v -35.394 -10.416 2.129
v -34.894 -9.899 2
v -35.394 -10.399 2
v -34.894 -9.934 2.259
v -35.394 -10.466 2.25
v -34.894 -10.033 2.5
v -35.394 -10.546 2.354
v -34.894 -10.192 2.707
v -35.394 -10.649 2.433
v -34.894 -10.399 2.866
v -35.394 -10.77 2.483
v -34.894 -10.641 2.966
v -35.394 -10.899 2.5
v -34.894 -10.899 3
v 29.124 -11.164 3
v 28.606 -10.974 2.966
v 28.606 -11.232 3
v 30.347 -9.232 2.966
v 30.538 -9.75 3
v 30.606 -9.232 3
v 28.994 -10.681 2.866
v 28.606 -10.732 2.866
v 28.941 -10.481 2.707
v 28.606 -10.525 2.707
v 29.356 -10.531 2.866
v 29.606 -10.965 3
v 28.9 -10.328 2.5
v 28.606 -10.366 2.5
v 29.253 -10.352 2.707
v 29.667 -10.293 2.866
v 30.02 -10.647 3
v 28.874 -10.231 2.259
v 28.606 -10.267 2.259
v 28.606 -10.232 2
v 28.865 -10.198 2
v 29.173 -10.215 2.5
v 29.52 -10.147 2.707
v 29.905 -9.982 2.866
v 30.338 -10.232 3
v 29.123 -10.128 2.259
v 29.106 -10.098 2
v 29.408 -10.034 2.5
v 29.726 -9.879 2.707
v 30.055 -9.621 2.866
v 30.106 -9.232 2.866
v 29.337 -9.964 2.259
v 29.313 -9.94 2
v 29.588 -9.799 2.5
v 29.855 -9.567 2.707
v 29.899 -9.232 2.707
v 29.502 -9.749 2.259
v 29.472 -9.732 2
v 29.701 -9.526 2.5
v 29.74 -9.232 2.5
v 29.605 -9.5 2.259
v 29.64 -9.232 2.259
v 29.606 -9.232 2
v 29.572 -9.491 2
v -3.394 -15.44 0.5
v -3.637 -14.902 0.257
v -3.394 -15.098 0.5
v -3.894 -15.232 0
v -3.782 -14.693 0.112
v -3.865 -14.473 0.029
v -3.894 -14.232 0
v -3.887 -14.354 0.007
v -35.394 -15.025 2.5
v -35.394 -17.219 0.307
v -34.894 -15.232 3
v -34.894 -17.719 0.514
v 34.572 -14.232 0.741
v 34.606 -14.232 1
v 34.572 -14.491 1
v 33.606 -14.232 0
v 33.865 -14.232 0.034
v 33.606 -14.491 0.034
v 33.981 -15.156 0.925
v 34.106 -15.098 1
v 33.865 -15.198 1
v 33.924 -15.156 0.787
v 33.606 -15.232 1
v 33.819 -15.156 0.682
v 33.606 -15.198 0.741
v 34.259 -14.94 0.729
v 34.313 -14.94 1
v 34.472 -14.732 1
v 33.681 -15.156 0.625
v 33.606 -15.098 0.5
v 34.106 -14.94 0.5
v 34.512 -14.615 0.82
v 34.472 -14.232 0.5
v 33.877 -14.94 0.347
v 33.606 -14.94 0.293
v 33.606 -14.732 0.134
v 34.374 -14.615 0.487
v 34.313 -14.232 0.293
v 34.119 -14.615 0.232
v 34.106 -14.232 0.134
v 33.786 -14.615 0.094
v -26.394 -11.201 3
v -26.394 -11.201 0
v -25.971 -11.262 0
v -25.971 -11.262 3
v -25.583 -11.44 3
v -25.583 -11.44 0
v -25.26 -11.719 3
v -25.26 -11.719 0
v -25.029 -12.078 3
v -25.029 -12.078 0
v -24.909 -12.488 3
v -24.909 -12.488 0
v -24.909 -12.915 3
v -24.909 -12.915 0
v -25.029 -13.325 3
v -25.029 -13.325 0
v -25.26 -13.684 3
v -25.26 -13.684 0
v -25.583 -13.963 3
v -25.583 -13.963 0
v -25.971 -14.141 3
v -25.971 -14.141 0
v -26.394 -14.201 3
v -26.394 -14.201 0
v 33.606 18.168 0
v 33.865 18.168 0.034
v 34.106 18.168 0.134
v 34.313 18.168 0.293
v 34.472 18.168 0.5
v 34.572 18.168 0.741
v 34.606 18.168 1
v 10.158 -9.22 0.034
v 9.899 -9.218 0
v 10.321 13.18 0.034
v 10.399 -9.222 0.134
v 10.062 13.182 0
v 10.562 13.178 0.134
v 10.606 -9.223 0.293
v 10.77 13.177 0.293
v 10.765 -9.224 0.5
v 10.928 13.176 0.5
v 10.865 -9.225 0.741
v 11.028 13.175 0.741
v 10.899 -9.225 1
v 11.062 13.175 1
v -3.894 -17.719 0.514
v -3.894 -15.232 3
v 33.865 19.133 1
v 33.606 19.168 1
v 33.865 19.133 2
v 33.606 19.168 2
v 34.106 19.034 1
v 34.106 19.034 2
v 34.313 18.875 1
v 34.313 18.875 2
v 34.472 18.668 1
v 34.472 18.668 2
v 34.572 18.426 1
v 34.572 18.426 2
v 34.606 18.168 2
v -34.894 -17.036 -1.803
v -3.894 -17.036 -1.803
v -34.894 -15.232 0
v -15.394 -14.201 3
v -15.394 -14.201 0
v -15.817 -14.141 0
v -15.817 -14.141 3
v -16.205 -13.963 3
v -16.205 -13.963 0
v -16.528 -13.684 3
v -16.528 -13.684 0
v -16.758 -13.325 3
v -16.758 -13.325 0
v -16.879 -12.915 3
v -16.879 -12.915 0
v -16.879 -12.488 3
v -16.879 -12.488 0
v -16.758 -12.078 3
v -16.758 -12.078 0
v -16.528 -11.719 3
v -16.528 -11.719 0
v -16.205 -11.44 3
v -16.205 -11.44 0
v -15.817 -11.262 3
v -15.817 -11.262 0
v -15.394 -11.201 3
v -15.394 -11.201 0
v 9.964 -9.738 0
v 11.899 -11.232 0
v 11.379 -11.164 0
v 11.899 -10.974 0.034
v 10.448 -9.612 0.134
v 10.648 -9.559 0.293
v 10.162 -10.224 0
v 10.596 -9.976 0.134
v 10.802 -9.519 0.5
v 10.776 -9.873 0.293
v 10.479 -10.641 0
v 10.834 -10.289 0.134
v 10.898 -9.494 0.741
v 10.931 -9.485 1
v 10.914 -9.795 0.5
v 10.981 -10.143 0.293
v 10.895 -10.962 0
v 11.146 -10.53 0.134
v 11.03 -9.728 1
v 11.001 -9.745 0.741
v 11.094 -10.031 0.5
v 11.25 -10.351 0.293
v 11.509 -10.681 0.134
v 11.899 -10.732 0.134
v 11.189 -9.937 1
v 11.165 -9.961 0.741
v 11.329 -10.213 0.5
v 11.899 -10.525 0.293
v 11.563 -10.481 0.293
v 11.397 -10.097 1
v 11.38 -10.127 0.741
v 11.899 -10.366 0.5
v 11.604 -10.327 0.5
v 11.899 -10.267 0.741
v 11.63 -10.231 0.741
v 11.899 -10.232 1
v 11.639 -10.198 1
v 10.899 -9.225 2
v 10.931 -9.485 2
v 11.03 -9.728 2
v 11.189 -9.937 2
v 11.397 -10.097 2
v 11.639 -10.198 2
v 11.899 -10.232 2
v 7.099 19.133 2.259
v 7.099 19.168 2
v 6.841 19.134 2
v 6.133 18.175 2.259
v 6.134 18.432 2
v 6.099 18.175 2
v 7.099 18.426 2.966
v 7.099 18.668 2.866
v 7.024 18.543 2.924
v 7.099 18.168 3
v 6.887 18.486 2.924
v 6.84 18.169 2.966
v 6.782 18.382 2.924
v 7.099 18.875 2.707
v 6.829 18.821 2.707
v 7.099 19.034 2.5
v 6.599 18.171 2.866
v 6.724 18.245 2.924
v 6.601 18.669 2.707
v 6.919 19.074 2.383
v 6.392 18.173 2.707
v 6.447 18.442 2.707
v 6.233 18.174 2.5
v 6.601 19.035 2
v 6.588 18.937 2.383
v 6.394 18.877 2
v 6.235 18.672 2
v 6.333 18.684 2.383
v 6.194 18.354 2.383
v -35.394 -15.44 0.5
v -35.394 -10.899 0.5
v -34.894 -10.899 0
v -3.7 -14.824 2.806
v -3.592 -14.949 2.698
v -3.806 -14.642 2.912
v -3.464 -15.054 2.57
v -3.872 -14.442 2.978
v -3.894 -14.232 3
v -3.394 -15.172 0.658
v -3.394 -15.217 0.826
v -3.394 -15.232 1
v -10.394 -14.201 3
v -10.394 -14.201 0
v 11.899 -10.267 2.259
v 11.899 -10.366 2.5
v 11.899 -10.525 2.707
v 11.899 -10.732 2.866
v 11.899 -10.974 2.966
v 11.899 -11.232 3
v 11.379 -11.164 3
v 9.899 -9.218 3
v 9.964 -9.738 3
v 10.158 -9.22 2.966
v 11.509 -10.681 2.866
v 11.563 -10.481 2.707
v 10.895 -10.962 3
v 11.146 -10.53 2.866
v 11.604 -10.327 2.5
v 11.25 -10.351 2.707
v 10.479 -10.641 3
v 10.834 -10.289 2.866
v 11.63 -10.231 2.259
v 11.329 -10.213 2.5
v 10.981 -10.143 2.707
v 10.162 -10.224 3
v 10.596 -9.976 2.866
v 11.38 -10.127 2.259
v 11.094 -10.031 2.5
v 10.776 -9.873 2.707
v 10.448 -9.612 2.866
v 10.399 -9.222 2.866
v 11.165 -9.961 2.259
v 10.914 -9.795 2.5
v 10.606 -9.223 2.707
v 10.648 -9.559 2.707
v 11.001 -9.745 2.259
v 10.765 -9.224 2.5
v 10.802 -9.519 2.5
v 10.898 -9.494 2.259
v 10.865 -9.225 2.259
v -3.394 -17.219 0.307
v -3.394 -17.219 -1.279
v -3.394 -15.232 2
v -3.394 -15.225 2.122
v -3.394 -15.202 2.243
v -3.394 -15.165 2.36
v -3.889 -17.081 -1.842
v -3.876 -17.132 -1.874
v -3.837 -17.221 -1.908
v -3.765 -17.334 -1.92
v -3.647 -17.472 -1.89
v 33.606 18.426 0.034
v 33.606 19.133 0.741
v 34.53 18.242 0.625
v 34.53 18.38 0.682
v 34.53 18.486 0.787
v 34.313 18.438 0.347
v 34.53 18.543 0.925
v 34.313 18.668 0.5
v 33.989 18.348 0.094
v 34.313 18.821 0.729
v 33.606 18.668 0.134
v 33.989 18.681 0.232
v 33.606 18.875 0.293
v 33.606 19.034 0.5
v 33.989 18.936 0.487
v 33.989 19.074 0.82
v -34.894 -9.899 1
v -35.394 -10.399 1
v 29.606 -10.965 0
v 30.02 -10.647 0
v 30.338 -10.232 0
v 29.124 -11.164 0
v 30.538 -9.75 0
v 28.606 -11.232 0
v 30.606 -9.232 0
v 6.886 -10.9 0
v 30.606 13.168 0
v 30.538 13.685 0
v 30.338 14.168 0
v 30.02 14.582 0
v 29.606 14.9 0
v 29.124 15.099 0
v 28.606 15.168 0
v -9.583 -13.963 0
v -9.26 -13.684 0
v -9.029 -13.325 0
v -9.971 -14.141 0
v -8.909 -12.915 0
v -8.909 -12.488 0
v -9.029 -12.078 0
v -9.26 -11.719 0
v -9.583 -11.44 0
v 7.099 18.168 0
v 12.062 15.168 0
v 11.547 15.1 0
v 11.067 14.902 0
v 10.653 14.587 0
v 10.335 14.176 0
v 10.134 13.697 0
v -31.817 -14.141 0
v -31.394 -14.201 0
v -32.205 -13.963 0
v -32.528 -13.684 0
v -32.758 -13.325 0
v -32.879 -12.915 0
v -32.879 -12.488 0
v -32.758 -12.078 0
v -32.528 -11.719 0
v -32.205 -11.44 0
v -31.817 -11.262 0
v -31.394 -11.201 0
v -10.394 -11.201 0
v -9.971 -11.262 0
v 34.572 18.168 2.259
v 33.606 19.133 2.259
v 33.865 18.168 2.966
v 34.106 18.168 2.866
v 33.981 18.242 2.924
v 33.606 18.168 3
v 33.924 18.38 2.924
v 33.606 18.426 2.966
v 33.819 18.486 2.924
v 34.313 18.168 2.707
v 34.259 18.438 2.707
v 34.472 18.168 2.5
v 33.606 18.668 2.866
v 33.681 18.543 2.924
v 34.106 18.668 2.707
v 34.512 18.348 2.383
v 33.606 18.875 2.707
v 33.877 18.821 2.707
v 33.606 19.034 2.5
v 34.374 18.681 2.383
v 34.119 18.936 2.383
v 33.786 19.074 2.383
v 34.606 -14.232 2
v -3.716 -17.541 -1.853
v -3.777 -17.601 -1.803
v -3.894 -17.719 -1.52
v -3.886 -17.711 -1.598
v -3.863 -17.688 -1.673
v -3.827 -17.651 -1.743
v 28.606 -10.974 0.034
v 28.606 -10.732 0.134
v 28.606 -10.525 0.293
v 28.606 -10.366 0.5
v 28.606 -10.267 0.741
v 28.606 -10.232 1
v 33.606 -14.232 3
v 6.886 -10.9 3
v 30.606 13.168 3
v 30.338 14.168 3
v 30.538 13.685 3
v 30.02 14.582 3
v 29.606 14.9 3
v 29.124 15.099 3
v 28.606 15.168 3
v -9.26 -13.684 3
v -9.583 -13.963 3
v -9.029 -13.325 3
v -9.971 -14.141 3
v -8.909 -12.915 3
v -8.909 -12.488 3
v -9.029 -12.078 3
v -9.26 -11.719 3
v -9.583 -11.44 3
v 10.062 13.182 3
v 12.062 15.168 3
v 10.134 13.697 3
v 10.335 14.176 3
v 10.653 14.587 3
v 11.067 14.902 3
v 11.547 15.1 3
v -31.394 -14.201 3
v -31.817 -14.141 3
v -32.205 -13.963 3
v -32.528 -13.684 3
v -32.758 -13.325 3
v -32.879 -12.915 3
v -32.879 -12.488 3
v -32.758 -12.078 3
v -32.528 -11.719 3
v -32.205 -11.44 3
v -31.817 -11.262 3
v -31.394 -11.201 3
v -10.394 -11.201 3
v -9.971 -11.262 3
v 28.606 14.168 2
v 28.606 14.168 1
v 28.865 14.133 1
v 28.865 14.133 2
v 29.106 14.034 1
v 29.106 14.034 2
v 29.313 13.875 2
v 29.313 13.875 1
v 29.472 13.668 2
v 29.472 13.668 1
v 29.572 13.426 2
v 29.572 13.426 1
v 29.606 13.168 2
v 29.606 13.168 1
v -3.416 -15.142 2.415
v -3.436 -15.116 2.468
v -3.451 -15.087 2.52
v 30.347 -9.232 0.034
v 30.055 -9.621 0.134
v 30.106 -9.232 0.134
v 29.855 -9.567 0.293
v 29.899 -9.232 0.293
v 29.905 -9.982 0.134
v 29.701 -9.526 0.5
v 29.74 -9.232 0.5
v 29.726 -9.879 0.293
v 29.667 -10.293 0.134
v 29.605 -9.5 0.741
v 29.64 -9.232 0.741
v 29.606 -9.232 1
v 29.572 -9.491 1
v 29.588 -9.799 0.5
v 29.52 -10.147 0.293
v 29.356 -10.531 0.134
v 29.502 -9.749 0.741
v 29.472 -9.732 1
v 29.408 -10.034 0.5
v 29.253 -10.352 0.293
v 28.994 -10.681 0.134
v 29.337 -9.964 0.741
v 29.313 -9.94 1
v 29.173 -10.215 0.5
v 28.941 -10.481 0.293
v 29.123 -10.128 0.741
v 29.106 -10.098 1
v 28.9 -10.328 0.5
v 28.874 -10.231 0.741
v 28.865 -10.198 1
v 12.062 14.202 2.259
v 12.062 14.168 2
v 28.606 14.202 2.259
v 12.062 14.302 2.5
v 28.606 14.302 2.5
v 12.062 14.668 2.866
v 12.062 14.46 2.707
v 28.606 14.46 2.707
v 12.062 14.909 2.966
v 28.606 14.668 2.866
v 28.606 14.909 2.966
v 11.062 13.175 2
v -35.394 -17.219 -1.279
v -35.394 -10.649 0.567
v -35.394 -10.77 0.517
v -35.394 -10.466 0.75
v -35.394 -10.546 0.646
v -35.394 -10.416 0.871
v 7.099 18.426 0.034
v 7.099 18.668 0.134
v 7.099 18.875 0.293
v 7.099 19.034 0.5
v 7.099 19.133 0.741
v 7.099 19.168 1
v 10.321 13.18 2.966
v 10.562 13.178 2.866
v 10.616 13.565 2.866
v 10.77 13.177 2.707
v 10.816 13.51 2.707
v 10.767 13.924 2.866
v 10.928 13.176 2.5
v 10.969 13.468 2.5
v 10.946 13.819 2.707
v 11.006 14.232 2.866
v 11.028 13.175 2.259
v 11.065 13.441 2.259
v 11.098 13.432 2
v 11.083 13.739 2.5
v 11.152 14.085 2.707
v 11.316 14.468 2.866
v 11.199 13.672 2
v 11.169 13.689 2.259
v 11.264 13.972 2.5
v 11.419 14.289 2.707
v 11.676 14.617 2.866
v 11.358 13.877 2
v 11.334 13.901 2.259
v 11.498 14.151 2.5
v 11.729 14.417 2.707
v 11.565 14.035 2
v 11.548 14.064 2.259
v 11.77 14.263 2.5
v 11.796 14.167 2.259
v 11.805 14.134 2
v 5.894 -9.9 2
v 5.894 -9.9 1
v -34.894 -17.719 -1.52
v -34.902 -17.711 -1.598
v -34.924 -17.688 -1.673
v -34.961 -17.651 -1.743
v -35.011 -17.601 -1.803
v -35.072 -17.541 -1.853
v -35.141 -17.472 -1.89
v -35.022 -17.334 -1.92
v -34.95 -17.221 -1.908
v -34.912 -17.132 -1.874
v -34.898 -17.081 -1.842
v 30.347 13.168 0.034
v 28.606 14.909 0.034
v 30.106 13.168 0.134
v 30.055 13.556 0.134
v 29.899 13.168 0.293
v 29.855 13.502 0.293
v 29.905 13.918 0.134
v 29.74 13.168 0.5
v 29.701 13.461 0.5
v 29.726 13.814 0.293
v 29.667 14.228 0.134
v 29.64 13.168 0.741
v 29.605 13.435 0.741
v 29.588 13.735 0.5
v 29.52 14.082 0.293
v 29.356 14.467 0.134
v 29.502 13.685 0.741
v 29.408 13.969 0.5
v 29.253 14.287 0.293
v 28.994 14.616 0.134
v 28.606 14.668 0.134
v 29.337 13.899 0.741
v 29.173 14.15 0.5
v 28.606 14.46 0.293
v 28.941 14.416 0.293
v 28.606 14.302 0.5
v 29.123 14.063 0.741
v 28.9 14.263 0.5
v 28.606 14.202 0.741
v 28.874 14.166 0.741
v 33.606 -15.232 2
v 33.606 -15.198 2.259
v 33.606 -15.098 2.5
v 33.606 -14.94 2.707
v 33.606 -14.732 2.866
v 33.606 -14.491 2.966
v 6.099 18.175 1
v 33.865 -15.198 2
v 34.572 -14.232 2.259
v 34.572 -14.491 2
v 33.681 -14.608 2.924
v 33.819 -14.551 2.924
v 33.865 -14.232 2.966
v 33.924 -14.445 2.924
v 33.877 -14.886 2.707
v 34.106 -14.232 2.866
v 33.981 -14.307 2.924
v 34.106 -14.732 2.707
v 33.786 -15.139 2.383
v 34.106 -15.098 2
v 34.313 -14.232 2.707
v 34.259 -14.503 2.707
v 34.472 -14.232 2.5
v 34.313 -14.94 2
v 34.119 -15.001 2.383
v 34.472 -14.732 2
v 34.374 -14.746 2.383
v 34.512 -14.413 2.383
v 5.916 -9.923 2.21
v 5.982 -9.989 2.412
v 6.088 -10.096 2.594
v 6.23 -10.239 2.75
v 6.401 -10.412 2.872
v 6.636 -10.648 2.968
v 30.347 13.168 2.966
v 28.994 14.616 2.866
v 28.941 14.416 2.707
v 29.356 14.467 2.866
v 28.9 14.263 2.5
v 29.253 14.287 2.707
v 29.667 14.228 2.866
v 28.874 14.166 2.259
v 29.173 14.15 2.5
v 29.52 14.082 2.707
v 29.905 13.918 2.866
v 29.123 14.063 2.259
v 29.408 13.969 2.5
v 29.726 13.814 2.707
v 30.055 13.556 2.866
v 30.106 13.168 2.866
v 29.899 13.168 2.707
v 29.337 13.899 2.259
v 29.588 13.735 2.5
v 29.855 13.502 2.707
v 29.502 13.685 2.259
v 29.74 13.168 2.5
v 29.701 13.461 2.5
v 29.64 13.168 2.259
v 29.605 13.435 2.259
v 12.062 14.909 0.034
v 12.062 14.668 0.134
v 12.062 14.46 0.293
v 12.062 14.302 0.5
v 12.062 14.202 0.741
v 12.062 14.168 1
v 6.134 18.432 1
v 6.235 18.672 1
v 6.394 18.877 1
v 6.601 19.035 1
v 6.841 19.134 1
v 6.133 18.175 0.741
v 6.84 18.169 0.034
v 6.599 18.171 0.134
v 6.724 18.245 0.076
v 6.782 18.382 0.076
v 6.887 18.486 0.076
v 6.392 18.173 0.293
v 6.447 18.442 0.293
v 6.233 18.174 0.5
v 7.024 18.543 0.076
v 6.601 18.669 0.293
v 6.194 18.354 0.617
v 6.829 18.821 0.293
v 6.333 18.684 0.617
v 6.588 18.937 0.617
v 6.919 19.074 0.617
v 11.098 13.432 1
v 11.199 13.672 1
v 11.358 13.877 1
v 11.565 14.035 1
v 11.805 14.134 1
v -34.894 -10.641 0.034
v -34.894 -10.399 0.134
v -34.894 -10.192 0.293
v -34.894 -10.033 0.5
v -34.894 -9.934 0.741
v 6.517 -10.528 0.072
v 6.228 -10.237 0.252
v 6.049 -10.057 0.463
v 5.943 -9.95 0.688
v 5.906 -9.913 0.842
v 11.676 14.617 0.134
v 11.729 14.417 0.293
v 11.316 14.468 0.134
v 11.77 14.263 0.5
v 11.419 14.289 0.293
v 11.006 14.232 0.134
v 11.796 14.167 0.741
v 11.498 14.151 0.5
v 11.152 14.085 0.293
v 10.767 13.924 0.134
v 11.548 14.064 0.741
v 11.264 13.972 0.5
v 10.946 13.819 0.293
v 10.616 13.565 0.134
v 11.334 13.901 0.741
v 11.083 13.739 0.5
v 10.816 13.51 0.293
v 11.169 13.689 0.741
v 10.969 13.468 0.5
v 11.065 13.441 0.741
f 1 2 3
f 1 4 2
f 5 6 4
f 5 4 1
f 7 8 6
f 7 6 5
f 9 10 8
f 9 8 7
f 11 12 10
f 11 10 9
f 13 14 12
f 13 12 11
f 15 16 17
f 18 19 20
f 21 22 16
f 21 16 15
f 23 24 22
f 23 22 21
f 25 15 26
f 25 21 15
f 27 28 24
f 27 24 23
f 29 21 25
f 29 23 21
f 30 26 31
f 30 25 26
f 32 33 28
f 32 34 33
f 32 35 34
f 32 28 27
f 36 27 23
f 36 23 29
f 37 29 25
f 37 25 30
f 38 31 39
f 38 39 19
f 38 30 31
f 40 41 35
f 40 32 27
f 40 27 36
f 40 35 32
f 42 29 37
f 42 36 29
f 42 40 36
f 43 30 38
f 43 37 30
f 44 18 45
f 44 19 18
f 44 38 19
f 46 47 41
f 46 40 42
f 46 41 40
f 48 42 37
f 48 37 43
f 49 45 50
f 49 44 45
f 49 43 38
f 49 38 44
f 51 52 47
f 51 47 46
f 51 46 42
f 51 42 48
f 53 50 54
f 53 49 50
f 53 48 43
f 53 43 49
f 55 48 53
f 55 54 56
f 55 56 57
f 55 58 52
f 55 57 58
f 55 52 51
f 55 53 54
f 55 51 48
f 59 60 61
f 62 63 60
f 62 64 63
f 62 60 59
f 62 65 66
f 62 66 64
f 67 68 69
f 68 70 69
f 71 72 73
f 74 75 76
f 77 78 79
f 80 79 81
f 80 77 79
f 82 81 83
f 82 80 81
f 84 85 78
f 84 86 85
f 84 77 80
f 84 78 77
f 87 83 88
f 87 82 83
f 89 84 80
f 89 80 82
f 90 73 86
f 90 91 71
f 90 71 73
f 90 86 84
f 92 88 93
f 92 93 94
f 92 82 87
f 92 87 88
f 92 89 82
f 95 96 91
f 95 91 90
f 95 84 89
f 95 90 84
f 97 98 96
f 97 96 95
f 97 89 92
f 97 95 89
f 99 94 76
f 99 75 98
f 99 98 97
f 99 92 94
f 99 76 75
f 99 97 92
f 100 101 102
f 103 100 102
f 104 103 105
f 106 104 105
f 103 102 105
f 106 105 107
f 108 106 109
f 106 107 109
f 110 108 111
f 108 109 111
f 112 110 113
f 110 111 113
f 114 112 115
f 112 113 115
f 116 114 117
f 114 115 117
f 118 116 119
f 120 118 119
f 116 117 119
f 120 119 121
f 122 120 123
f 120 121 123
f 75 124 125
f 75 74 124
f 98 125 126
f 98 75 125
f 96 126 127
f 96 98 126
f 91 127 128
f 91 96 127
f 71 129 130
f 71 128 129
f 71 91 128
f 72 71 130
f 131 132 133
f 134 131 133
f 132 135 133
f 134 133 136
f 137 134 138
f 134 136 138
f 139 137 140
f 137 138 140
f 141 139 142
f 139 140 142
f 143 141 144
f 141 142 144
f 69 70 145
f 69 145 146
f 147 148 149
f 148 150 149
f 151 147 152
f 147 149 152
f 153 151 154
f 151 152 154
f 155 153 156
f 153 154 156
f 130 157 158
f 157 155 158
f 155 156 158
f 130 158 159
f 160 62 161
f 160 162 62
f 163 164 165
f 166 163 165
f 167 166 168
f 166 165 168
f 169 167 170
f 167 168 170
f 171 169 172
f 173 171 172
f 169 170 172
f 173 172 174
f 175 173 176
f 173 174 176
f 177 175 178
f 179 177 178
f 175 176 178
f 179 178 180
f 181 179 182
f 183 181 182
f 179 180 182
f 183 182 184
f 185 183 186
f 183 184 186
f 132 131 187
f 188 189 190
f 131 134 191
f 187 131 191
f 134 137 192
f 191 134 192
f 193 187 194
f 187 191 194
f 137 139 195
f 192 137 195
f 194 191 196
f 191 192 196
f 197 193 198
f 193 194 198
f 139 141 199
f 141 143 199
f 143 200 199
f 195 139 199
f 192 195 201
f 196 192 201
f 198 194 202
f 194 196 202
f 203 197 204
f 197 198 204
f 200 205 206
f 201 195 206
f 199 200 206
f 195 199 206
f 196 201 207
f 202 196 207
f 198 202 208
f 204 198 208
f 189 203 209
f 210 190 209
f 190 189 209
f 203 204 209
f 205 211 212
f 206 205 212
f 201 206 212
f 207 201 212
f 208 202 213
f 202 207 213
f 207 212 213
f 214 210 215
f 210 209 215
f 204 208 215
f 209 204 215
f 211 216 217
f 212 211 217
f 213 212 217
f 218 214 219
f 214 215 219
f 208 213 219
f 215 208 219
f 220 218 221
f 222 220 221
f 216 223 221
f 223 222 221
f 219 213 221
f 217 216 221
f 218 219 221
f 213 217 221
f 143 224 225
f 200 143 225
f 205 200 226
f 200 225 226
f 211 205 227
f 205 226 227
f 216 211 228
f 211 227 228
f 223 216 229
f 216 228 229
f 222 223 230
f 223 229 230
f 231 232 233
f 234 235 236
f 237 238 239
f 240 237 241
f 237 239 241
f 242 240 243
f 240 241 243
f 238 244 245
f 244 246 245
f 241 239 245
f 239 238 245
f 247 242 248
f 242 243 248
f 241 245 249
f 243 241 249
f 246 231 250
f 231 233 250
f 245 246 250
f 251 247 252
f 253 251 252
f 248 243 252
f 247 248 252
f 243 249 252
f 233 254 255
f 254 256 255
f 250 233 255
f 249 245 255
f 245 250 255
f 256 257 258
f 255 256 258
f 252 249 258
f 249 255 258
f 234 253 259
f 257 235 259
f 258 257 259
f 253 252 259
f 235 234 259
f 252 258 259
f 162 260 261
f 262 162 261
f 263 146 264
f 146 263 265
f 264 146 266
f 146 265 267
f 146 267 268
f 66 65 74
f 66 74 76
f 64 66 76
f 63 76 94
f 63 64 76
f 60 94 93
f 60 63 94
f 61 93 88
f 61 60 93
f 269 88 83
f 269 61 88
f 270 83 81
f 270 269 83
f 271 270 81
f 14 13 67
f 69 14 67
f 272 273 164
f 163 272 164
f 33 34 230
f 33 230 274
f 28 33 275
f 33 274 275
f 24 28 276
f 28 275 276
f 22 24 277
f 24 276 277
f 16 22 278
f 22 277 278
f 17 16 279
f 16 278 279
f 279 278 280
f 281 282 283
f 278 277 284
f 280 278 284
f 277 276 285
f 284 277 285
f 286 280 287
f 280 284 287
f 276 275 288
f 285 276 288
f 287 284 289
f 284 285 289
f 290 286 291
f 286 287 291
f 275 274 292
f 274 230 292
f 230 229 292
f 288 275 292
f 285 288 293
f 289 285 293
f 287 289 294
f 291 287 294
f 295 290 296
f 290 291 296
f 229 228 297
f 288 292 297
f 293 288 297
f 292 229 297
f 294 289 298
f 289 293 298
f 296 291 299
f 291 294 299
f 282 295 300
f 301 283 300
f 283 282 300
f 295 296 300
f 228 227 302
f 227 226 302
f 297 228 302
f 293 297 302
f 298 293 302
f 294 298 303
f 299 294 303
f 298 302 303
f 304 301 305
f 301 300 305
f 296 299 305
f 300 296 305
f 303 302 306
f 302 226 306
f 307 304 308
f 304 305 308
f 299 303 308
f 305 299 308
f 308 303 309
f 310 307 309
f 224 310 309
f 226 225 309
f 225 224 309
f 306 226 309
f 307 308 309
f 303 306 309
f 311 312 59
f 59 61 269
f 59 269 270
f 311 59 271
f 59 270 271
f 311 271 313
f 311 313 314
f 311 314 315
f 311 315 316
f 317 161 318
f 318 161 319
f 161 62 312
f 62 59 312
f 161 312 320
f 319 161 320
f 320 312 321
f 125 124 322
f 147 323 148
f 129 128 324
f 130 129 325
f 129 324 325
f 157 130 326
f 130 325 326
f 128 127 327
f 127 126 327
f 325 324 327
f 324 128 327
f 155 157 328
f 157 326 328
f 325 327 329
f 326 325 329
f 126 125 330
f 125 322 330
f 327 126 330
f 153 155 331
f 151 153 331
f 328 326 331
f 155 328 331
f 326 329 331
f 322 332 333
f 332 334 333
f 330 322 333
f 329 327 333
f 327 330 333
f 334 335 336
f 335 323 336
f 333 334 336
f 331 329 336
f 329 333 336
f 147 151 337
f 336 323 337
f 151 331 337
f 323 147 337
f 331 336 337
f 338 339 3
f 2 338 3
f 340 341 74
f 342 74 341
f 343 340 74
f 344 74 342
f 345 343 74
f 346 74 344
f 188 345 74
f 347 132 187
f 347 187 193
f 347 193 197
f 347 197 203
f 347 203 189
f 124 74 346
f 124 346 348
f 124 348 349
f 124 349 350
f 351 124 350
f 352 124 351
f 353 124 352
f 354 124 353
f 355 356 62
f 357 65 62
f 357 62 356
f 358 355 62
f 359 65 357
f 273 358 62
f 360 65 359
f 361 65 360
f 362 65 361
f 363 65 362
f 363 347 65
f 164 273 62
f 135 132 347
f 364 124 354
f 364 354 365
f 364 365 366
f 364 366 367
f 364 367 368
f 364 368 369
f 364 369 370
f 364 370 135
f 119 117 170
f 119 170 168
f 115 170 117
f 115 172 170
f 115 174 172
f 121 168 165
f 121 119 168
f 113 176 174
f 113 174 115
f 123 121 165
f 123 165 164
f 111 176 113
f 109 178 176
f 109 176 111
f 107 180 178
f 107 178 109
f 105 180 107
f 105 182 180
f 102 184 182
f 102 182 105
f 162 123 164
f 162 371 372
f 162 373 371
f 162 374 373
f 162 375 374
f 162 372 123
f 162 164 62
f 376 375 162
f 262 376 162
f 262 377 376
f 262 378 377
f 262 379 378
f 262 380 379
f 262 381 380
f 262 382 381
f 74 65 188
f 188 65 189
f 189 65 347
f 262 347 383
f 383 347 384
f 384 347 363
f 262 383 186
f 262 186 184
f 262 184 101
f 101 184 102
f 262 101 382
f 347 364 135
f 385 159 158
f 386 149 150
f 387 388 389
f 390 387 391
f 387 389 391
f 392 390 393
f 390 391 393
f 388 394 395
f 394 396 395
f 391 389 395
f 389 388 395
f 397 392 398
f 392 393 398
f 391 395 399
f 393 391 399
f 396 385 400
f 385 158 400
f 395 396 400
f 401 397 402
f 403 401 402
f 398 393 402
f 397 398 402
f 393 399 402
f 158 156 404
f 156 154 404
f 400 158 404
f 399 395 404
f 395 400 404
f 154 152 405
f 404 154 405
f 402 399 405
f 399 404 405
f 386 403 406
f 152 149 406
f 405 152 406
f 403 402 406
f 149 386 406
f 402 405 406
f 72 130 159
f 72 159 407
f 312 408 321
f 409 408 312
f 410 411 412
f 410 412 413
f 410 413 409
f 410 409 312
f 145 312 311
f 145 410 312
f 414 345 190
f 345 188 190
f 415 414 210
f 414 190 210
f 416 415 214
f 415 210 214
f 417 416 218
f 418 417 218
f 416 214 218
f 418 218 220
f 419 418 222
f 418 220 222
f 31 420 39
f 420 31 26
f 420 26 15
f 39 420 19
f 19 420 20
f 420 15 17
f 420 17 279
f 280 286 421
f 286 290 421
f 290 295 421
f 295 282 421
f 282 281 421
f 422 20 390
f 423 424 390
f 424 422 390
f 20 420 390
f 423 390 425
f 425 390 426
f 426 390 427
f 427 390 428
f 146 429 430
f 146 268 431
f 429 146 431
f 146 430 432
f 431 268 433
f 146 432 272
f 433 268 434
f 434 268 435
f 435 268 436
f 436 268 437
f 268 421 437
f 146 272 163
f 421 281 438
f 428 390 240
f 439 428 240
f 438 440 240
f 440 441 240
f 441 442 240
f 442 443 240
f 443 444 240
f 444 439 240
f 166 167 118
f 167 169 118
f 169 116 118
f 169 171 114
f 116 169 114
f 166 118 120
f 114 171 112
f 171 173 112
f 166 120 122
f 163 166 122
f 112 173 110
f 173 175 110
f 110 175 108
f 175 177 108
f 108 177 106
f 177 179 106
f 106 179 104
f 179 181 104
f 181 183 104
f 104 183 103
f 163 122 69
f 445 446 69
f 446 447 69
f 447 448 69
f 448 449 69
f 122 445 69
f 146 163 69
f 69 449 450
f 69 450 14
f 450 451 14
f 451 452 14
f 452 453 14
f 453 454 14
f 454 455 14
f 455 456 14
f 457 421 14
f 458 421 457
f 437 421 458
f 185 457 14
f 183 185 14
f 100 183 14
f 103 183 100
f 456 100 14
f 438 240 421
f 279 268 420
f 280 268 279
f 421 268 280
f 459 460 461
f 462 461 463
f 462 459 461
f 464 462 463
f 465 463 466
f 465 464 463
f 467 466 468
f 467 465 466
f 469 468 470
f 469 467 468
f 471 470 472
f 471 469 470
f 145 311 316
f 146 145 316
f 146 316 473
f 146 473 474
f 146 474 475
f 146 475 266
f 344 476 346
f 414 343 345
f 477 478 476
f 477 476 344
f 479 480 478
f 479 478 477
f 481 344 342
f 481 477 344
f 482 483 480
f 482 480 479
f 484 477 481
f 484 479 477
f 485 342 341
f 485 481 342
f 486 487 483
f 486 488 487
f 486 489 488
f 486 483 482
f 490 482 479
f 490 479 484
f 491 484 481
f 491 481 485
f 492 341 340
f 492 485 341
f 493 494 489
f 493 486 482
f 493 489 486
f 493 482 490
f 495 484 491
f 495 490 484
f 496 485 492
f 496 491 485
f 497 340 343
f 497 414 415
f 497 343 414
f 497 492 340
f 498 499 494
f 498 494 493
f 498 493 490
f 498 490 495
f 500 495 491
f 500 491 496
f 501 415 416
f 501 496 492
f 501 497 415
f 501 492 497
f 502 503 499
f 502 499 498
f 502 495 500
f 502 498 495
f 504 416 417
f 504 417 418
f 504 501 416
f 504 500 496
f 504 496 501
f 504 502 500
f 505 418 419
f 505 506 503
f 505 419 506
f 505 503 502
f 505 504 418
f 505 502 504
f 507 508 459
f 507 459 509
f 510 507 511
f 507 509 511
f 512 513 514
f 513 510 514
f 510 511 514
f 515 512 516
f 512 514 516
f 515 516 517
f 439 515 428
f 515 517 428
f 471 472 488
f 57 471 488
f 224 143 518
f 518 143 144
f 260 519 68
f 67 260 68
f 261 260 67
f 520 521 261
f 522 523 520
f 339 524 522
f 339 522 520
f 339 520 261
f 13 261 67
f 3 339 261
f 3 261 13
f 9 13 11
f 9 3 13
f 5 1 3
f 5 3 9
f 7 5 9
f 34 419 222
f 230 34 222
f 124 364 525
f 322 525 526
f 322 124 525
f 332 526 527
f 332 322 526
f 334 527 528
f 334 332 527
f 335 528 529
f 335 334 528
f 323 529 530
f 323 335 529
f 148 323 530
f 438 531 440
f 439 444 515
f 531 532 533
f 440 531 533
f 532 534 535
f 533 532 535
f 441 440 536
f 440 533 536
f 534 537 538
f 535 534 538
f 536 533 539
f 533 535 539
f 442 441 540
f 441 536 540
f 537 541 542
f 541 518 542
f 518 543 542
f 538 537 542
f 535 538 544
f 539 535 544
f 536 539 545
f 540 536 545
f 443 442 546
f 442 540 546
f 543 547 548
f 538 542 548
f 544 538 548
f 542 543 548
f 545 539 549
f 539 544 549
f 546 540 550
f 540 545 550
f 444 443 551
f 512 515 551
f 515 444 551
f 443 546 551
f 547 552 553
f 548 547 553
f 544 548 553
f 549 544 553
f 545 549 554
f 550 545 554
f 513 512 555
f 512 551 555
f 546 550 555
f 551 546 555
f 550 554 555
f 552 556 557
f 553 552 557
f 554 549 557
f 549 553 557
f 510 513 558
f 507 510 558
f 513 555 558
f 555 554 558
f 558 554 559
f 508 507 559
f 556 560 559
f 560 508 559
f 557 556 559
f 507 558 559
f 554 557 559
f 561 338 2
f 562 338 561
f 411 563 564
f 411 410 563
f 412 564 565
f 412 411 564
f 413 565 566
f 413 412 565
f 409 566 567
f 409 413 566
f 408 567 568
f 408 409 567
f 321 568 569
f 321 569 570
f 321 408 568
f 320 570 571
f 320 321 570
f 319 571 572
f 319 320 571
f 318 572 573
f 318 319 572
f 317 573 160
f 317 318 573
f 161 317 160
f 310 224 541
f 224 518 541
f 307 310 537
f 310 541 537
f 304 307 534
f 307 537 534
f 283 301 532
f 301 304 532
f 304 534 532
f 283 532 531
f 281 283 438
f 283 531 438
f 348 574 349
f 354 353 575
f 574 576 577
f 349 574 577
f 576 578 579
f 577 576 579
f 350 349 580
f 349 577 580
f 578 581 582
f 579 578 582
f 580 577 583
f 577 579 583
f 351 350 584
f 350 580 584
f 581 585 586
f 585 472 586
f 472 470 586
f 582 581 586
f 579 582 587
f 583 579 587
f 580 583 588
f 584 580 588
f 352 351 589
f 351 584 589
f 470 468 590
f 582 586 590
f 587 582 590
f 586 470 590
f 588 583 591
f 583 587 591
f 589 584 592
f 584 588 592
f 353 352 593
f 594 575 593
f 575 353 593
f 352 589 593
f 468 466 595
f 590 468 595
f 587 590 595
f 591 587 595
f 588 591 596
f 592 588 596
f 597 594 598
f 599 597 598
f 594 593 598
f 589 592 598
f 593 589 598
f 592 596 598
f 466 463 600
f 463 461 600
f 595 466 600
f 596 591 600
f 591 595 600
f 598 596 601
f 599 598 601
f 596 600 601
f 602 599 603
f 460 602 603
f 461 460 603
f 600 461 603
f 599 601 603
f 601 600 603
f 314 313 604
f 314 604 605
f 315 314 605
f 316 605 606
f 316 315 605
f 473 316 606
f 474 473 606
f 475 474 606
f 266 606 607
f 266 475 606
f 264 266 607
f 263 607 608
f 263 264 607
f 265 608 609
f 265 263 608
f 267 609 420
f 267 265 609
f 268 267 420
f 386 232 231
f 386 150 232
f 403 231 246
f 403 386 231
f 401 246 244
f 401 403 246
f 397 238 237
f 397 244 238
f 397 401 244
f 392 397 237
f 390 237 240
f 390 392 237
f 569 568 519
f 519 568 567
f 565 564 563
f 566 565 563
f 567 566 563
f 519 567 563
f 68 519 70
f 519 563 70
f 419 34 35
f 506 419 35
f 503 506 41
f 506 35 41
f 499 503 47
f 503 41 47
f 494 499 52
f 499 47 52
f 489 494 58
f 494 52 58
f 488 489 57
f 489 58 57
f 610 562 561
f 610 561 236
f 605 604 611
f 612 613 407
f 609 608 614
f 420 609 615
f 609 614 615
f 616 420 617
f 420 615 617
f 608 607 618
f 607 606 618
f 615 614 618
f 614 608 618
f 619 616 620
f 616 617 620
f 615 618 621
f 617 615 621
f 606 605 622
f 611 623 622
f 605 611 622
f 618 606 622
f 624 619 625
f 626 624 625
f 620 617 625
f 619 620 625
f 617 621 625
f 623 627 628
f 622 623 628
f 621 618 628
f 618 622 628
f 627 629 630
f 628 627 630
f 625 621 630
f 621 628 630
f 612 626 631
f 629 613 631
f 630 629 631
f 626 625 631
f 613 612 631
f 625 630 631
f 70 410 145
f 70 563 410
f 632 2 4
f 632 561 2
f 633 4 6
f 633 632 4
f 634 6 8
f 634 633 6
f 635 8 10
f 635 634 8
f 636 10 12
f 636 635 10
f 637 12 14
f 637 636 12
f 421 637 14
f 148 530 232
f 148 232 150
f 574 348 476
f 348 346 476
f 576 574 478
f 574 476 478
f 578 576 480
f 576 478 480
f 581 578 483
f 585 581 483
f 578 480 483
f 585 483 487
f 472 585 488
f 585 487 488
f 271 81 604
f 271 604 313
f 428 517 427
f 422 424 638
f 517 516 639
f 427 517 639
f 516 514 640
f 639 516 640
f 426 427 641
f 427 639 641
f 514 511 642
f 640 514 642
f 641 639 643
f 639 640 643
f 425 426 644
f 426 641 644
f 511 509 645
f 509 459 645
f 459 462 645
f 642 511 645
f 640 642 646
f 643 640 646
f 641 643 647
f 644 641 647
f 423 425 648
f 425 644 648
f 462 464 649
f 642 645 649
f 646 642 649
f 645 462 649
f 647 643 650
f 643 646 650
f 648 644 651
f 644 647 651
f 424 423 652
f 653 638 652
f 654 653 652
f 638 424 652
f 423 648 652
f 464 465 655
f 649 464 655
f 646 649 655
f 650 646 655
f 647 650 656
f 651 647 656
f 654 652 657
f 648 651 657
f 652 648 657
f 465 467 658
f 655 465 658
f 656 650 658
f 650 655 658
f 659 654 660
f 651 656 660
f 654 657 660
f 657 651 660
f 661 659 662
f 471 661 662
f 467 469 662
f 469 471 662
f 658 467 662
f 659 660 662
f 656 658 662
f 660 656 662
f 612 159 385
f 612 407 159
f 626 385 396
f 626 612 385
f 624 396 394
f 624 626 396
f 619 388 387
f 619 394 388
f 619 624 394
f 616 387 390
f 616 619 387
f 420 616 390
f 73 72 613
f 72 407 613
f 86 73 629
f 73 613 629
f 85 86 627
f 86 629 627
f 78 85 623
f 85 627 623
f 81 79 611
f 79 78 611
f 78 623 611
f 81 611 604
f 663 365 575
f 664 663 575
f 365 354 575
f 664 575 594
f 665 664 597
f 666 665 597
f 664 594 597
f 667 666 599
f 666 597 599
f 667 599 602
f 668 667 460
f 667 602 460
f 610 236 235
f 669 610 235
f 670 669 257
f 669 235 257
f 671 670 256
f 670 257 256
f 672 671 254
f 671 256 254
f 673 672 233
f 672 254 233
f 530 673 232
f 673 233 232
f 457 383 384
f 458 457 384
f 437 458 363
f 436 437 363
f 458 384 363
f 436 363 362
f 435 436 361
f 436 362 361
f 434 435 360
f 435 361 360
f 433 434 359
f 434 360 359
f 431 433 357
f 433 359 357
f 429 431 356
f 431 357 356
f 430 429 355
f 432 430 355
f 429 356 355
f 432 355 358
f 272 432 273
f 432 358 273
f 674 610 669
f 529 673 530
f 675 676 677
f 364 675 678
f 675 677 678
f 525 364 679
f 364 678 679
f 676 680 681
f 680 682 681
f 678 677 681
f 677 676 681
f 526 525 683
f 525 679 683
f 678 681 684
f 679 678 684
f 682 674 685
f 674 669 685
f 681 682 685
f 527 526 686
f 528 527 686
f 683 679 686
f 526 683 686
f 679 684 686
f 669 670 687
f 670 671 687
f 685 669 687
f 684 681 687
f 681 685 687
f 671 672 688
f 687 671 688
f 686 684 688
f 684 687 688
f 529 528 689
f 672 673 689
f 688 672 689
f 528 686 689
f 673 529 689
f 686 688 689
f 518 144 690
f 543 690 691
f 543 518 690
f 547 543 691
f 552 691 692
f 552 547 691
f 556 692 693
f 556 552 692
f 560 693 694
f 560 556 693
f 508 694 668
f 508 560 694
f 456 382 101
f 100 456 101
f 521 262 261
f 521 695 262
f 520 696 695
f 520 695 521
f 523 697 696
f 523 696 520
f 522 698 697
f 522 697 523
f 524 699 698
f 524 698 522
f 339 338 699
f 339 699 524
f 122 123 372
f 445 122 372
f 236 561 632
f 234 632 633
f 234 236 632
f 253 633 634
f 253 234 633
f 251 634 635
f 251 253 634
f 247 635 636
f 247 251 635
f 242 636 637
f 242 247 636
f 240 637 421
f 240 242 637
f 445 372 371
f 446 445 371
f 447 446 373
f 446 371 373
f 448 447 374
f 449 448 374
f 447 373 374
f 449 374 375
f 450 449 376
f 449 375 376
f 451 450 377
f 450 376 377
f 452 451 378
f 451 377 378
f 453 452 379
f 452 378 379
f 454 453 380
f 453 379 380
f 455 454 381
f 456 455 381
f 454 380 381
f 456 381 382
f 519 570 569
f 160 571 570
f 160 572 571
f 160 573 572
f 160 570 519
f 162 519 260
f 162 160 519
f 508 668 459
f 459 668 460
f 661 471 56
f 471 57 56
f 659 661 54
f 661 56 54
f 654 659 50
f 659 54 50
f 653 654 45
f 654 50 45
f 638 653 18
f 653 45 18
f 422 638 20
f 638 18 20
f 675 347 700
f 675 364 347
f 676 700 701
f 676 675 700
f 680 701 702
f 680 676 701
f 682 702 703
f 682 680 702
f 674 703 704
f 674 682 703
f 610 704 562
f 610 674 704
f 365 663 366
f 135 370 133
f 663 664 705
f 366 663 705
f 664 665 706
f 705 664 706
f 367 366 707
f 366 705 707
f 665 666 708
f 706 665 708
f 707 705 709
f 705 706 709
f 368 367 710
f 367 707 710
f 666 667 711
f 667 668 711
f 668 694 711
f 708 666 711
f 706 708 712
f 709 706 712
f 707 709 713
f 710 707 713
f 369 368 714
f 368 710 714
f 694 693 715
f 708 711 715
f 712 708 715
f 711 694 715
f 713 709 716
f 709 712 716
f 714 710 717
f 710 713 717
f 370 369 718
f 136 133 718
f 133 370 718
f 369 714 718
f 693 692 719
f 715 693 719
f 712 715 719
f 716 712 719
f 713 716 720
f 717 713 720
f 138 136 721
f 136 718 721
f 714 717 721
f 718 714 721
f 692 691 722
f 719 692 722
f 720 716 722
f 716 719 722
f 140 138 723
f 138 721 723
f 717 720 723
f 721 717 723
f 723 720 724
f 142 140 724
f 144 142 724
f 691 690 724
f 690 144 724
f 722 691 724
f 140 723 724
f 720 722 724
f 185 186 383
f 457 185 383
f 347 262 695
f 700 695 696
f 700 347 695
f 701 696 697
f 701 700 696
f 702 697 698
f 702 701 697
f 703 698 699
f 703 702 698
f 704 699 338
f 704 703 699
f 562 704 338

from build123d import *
from OCP.BRepFilletAPI import BRepFilletAPI_MakeChamfer

# Parameters (mm, degrees)
RESSALTO_EXTRUS_O1_DEPTH = 3
RESSALTO_EXTRUS_O2_DEPTH = 32
FILETE1_R                = 1
CHANFRO1_SIZE            = 0.5
CHANFRO1_SIZE_2          = 0.499987399
CHANFRO1_SIZE_3          = 0.499991089
FILETE10_R               = 0.4


with BuildPart() as part:
    # Esboço1 → Ressalto-extrusão1 (new body)
    with BuildSketch(Plane.XY):
        Polygon((5.893734702, -9.900463955), (6.106086441, 19.167541422), (34.606086441, 19.167541422), (34.606086441, -15.232458579), (-35.393913559, -15.232458579), (-35.393913559, -9.89942335), align=None)
        Polygon((10.891442786, -10.232458579), (11.069693146, 14.167541422), (29.606086441, 14.167541422), (29.606086441, -10.232458579), align=None, mode=Mode.SUBTRACT)
        with BuildLine():
            Line((-31.393913559, -11.201458579), (-26.393913559, -11.201458579))
            ThreePointArc((-26.393913559, -11.201458579), (-24.893913559, -12.701458579), (-26.393913559, -14.201458579))
            Line((-26.393913559, -14.201458579), (-31.393913559, -14.201458579))
            ThreePointArc((-31.393913559, -14.201458579), (-32.893913559, -12.701458579), (-31.393913559, -11.201458579))
        make_face(mode=Mode.SUBTRACT)
        with BuildLine():
            Line((-15.393913559, -11.201458579), (-10.393913559, -11.201458579))
            ThreePointArc((-10.393913559, -11.201458579), (-8.893913559, -12.701458579), (-10.393913559, -14.201458579))
            Line((-10.393913559, -14.201458579), (-15.393913559, -14.201458579))
            ThreePointArc((-15.393913559, -14.201458579), (-16.893913559, -12.701458579), (-15.393913559, -11.201458579))
        make_face(mode=Mode.SUBTRACT)
    extrude(amount=RESSALTO_EXTRUS_O1_DEPTH)

    # Esboço2 → Ressalto-extrusão2 (add)
    with BuildSketch(Plane.ZY.offset(35.393913559)):
        Polygon((0, -15.232458579), (-2.486055277, -17.718513856), (0.513944723, -17.718513856), (3, -15.232458579), align=None)
    extrude(amount=-RESSALTO_EXTRUS_O2_DEPTH)

    # Filete1
    filete1_edges = [part.edges().sort_by_distance(p)[0] for p in [
        (5.999910572, 4.633538733, 0),
        (20.356086441, 19.167541422, 0),
        (34.606086441, 1.967541422, 0),
        (-14.750089428, -9.899943653, 0),
        (29.606086441, 1.967541422, 0),
        (20.337889794, 14.167541422, 0),
        (10.980567966, 1.967541422, 0),
        (20.248764614, -10.232458579, 0),
        (6.106086441, 19.167541422, 1.5),
        (34.606086441, 19.167541422, 1.5),
        (34.606086441, -15.232458579, 1.5),
        (29.606086441, -10.232458579, 1.5),
        (29.606086441, 14.167541422, 1.5),
        (11.069693146, 14.167541422, 1.5),
        (10.891442786, -10.232458579, 1.5),
        (20.248764614, -10.232458579, 3),
        (10.980567966, 1.967541422, 3),
        (15.606086441, -15.232458579, 0),
        (15.606086441, -15.232458579, 3),
        (20.337889794, 14.167541422, 3),
        (29.606086441, 1.967541422, 3),
        (-14.750089428, -9.899943653, 3),
        (34.606086441, 1.967541422, 3),
        (20.356086441, 19.167541422, 3),
        (5.999910572, 4.633538733, 3),
    ]]
    fillet(filete1_edges, radius=FILETE1_R)

    # Chanfro1
    chanfro1_edges_1 = [part.edges().sort_by_distance(p)[0] for p in [
        (-35.393913559, -9.89942335, 1.5),
    ]]
    chanfro1_side_1 = [part.faces().sort_by_distance(p)[0] for p in [
        (-35.383913811, -9.899423602, 1.5),
    ]]
    chanfro1_edges_2 = [part.edges().sort_by_distance(p)[0] for p in [
        (-35.393895737, -10.19231657, 0.292893219),
    ]]
    chanfro1_side_2 = [part.faces().sort_by_distance(p)[0] for p in [
        (-35.393895737, -10.199387512, 0.299964161),
    ]]
    chanfro1_edges_3 = [part.edges().sort_by_distance(p)[0] for p in [
        (-35.393895737, -10.19231657, 2.707106781),
    ]]
    chanfro1_side_3 = [part.faces().sort_by_distance(p)[0] for p in [
        (-35.393895737, -10.199387512, 2.700035839),
    ]]
    chanfro1_edges_4 = [part.edges().sort_by_distance(p)[0] for p in [
        (-35.393913559, -13.065940965, 0),
        (-35.393913559, -13.065940965, 3),
    ]]
    chanfro1 = BRepFilletAPI_MakeChamfer(part.part.solid().wrapped)
    for e in chanfro1_edges_1:
        chanfro1.Add(CHANFRO1_SIZE, CHANFRO1_SIZE_2, e.wrapped, chanfro1_side_1[0].wrapped)
    for e in chanfro1_edges_2:
        chanfro1.Add(CHANFRO1_SIZE, CHANFRO1_SIZE_3, e.wrapped, chanfro1_side_2[0].wrapped)
    for e in chanfro1_edges_3:
        chanfro1.Add(CHANFRO1_SIZE, CHANFRO1_SIZE_3, e.wrapped, chanfro1_side_3[0].wrapped)
    for e in chanfro1_edges_4:
        chanfro1.Add(CHANFRO1_SIZE, e.wrapped)
    add(Compound.cast(chanfro1.Shape()), mode=Mode.REPLACE)
    chanfro1_2_edges = [part.edges().sort_by_distance(p)[0] for p in [
        (-35.393913559, -16.475486217, -1.243027639),
    ]]
    chamfer(chanfro1_2_edges, length=CHANFRO1_SIZE)
    chanfro1_3_edges = [part.edges().sort_by_distance(p)[0] for p in [
        (-35.393913559, -16.725479917, 1.506978662),
    ]]
    chamfer(chanfro1_3_edges, length=CHANFRO1_SIZE)
    chanfro1_4_edges = [part.edges().sort_by_distance(p)[0] for p in [
        (-35.393913559, -17.718513856, -0.986055277),
    ]]
    chamfer(chanfro1_4_edges, length=CHANFRO1_SIZE)
    chanfro1_5_edges = [part.edges().sort_by_distance(p)[0] for p in [
        (-3.393913559, -14.732458579, 3),
    ]]
    chamfer(chanfro1_5_edges, length=CHANFRO1_SIZE)
    chanfro1_6_edges = [part.edges().sort_by_distance(p)[0] for p in [
        (-3.393913559, -16.475486217, -1.243027639),
    ]]
    chamfer(chanfro1_6_edges, length=CHANFRO1_SIZE)
    chanfro1_7_edges = [part.edges().sort_by_distance(p)[0] for p in [
        (-3.393913559, -16.725486217, 1.506972361),
    ]]
    chamfer(chanfro1_7_edges, length=CHANFRO1_SIZE)
    chanfro1_8_edges = [part.edges().sort_by_distance(p)[0] for p in [
        (-3.393913559, -17.718513856, -0.986055277),
    ]]
    chamfer(chanfro1_8_edges, length=CHANFRO1_SIZE)
    chanfro1_9_edges = [part.edges().sort_by_distance(p)[0] for p in [
        (-3.393913559, -14.732458579, 0),
    ]]
    chamfer(chanfro1_9_edges, length=CHANFRO1_SIZE)

    # Filete10
    filete10_edges = [part.edges().sort_by_distance(p)[0] for p in [
        (-19.393913559, -17.718513856, -2.486055277),
    ]]
    fillet(filete10_edges, radius=FILETE10_R)


solid = part.part
